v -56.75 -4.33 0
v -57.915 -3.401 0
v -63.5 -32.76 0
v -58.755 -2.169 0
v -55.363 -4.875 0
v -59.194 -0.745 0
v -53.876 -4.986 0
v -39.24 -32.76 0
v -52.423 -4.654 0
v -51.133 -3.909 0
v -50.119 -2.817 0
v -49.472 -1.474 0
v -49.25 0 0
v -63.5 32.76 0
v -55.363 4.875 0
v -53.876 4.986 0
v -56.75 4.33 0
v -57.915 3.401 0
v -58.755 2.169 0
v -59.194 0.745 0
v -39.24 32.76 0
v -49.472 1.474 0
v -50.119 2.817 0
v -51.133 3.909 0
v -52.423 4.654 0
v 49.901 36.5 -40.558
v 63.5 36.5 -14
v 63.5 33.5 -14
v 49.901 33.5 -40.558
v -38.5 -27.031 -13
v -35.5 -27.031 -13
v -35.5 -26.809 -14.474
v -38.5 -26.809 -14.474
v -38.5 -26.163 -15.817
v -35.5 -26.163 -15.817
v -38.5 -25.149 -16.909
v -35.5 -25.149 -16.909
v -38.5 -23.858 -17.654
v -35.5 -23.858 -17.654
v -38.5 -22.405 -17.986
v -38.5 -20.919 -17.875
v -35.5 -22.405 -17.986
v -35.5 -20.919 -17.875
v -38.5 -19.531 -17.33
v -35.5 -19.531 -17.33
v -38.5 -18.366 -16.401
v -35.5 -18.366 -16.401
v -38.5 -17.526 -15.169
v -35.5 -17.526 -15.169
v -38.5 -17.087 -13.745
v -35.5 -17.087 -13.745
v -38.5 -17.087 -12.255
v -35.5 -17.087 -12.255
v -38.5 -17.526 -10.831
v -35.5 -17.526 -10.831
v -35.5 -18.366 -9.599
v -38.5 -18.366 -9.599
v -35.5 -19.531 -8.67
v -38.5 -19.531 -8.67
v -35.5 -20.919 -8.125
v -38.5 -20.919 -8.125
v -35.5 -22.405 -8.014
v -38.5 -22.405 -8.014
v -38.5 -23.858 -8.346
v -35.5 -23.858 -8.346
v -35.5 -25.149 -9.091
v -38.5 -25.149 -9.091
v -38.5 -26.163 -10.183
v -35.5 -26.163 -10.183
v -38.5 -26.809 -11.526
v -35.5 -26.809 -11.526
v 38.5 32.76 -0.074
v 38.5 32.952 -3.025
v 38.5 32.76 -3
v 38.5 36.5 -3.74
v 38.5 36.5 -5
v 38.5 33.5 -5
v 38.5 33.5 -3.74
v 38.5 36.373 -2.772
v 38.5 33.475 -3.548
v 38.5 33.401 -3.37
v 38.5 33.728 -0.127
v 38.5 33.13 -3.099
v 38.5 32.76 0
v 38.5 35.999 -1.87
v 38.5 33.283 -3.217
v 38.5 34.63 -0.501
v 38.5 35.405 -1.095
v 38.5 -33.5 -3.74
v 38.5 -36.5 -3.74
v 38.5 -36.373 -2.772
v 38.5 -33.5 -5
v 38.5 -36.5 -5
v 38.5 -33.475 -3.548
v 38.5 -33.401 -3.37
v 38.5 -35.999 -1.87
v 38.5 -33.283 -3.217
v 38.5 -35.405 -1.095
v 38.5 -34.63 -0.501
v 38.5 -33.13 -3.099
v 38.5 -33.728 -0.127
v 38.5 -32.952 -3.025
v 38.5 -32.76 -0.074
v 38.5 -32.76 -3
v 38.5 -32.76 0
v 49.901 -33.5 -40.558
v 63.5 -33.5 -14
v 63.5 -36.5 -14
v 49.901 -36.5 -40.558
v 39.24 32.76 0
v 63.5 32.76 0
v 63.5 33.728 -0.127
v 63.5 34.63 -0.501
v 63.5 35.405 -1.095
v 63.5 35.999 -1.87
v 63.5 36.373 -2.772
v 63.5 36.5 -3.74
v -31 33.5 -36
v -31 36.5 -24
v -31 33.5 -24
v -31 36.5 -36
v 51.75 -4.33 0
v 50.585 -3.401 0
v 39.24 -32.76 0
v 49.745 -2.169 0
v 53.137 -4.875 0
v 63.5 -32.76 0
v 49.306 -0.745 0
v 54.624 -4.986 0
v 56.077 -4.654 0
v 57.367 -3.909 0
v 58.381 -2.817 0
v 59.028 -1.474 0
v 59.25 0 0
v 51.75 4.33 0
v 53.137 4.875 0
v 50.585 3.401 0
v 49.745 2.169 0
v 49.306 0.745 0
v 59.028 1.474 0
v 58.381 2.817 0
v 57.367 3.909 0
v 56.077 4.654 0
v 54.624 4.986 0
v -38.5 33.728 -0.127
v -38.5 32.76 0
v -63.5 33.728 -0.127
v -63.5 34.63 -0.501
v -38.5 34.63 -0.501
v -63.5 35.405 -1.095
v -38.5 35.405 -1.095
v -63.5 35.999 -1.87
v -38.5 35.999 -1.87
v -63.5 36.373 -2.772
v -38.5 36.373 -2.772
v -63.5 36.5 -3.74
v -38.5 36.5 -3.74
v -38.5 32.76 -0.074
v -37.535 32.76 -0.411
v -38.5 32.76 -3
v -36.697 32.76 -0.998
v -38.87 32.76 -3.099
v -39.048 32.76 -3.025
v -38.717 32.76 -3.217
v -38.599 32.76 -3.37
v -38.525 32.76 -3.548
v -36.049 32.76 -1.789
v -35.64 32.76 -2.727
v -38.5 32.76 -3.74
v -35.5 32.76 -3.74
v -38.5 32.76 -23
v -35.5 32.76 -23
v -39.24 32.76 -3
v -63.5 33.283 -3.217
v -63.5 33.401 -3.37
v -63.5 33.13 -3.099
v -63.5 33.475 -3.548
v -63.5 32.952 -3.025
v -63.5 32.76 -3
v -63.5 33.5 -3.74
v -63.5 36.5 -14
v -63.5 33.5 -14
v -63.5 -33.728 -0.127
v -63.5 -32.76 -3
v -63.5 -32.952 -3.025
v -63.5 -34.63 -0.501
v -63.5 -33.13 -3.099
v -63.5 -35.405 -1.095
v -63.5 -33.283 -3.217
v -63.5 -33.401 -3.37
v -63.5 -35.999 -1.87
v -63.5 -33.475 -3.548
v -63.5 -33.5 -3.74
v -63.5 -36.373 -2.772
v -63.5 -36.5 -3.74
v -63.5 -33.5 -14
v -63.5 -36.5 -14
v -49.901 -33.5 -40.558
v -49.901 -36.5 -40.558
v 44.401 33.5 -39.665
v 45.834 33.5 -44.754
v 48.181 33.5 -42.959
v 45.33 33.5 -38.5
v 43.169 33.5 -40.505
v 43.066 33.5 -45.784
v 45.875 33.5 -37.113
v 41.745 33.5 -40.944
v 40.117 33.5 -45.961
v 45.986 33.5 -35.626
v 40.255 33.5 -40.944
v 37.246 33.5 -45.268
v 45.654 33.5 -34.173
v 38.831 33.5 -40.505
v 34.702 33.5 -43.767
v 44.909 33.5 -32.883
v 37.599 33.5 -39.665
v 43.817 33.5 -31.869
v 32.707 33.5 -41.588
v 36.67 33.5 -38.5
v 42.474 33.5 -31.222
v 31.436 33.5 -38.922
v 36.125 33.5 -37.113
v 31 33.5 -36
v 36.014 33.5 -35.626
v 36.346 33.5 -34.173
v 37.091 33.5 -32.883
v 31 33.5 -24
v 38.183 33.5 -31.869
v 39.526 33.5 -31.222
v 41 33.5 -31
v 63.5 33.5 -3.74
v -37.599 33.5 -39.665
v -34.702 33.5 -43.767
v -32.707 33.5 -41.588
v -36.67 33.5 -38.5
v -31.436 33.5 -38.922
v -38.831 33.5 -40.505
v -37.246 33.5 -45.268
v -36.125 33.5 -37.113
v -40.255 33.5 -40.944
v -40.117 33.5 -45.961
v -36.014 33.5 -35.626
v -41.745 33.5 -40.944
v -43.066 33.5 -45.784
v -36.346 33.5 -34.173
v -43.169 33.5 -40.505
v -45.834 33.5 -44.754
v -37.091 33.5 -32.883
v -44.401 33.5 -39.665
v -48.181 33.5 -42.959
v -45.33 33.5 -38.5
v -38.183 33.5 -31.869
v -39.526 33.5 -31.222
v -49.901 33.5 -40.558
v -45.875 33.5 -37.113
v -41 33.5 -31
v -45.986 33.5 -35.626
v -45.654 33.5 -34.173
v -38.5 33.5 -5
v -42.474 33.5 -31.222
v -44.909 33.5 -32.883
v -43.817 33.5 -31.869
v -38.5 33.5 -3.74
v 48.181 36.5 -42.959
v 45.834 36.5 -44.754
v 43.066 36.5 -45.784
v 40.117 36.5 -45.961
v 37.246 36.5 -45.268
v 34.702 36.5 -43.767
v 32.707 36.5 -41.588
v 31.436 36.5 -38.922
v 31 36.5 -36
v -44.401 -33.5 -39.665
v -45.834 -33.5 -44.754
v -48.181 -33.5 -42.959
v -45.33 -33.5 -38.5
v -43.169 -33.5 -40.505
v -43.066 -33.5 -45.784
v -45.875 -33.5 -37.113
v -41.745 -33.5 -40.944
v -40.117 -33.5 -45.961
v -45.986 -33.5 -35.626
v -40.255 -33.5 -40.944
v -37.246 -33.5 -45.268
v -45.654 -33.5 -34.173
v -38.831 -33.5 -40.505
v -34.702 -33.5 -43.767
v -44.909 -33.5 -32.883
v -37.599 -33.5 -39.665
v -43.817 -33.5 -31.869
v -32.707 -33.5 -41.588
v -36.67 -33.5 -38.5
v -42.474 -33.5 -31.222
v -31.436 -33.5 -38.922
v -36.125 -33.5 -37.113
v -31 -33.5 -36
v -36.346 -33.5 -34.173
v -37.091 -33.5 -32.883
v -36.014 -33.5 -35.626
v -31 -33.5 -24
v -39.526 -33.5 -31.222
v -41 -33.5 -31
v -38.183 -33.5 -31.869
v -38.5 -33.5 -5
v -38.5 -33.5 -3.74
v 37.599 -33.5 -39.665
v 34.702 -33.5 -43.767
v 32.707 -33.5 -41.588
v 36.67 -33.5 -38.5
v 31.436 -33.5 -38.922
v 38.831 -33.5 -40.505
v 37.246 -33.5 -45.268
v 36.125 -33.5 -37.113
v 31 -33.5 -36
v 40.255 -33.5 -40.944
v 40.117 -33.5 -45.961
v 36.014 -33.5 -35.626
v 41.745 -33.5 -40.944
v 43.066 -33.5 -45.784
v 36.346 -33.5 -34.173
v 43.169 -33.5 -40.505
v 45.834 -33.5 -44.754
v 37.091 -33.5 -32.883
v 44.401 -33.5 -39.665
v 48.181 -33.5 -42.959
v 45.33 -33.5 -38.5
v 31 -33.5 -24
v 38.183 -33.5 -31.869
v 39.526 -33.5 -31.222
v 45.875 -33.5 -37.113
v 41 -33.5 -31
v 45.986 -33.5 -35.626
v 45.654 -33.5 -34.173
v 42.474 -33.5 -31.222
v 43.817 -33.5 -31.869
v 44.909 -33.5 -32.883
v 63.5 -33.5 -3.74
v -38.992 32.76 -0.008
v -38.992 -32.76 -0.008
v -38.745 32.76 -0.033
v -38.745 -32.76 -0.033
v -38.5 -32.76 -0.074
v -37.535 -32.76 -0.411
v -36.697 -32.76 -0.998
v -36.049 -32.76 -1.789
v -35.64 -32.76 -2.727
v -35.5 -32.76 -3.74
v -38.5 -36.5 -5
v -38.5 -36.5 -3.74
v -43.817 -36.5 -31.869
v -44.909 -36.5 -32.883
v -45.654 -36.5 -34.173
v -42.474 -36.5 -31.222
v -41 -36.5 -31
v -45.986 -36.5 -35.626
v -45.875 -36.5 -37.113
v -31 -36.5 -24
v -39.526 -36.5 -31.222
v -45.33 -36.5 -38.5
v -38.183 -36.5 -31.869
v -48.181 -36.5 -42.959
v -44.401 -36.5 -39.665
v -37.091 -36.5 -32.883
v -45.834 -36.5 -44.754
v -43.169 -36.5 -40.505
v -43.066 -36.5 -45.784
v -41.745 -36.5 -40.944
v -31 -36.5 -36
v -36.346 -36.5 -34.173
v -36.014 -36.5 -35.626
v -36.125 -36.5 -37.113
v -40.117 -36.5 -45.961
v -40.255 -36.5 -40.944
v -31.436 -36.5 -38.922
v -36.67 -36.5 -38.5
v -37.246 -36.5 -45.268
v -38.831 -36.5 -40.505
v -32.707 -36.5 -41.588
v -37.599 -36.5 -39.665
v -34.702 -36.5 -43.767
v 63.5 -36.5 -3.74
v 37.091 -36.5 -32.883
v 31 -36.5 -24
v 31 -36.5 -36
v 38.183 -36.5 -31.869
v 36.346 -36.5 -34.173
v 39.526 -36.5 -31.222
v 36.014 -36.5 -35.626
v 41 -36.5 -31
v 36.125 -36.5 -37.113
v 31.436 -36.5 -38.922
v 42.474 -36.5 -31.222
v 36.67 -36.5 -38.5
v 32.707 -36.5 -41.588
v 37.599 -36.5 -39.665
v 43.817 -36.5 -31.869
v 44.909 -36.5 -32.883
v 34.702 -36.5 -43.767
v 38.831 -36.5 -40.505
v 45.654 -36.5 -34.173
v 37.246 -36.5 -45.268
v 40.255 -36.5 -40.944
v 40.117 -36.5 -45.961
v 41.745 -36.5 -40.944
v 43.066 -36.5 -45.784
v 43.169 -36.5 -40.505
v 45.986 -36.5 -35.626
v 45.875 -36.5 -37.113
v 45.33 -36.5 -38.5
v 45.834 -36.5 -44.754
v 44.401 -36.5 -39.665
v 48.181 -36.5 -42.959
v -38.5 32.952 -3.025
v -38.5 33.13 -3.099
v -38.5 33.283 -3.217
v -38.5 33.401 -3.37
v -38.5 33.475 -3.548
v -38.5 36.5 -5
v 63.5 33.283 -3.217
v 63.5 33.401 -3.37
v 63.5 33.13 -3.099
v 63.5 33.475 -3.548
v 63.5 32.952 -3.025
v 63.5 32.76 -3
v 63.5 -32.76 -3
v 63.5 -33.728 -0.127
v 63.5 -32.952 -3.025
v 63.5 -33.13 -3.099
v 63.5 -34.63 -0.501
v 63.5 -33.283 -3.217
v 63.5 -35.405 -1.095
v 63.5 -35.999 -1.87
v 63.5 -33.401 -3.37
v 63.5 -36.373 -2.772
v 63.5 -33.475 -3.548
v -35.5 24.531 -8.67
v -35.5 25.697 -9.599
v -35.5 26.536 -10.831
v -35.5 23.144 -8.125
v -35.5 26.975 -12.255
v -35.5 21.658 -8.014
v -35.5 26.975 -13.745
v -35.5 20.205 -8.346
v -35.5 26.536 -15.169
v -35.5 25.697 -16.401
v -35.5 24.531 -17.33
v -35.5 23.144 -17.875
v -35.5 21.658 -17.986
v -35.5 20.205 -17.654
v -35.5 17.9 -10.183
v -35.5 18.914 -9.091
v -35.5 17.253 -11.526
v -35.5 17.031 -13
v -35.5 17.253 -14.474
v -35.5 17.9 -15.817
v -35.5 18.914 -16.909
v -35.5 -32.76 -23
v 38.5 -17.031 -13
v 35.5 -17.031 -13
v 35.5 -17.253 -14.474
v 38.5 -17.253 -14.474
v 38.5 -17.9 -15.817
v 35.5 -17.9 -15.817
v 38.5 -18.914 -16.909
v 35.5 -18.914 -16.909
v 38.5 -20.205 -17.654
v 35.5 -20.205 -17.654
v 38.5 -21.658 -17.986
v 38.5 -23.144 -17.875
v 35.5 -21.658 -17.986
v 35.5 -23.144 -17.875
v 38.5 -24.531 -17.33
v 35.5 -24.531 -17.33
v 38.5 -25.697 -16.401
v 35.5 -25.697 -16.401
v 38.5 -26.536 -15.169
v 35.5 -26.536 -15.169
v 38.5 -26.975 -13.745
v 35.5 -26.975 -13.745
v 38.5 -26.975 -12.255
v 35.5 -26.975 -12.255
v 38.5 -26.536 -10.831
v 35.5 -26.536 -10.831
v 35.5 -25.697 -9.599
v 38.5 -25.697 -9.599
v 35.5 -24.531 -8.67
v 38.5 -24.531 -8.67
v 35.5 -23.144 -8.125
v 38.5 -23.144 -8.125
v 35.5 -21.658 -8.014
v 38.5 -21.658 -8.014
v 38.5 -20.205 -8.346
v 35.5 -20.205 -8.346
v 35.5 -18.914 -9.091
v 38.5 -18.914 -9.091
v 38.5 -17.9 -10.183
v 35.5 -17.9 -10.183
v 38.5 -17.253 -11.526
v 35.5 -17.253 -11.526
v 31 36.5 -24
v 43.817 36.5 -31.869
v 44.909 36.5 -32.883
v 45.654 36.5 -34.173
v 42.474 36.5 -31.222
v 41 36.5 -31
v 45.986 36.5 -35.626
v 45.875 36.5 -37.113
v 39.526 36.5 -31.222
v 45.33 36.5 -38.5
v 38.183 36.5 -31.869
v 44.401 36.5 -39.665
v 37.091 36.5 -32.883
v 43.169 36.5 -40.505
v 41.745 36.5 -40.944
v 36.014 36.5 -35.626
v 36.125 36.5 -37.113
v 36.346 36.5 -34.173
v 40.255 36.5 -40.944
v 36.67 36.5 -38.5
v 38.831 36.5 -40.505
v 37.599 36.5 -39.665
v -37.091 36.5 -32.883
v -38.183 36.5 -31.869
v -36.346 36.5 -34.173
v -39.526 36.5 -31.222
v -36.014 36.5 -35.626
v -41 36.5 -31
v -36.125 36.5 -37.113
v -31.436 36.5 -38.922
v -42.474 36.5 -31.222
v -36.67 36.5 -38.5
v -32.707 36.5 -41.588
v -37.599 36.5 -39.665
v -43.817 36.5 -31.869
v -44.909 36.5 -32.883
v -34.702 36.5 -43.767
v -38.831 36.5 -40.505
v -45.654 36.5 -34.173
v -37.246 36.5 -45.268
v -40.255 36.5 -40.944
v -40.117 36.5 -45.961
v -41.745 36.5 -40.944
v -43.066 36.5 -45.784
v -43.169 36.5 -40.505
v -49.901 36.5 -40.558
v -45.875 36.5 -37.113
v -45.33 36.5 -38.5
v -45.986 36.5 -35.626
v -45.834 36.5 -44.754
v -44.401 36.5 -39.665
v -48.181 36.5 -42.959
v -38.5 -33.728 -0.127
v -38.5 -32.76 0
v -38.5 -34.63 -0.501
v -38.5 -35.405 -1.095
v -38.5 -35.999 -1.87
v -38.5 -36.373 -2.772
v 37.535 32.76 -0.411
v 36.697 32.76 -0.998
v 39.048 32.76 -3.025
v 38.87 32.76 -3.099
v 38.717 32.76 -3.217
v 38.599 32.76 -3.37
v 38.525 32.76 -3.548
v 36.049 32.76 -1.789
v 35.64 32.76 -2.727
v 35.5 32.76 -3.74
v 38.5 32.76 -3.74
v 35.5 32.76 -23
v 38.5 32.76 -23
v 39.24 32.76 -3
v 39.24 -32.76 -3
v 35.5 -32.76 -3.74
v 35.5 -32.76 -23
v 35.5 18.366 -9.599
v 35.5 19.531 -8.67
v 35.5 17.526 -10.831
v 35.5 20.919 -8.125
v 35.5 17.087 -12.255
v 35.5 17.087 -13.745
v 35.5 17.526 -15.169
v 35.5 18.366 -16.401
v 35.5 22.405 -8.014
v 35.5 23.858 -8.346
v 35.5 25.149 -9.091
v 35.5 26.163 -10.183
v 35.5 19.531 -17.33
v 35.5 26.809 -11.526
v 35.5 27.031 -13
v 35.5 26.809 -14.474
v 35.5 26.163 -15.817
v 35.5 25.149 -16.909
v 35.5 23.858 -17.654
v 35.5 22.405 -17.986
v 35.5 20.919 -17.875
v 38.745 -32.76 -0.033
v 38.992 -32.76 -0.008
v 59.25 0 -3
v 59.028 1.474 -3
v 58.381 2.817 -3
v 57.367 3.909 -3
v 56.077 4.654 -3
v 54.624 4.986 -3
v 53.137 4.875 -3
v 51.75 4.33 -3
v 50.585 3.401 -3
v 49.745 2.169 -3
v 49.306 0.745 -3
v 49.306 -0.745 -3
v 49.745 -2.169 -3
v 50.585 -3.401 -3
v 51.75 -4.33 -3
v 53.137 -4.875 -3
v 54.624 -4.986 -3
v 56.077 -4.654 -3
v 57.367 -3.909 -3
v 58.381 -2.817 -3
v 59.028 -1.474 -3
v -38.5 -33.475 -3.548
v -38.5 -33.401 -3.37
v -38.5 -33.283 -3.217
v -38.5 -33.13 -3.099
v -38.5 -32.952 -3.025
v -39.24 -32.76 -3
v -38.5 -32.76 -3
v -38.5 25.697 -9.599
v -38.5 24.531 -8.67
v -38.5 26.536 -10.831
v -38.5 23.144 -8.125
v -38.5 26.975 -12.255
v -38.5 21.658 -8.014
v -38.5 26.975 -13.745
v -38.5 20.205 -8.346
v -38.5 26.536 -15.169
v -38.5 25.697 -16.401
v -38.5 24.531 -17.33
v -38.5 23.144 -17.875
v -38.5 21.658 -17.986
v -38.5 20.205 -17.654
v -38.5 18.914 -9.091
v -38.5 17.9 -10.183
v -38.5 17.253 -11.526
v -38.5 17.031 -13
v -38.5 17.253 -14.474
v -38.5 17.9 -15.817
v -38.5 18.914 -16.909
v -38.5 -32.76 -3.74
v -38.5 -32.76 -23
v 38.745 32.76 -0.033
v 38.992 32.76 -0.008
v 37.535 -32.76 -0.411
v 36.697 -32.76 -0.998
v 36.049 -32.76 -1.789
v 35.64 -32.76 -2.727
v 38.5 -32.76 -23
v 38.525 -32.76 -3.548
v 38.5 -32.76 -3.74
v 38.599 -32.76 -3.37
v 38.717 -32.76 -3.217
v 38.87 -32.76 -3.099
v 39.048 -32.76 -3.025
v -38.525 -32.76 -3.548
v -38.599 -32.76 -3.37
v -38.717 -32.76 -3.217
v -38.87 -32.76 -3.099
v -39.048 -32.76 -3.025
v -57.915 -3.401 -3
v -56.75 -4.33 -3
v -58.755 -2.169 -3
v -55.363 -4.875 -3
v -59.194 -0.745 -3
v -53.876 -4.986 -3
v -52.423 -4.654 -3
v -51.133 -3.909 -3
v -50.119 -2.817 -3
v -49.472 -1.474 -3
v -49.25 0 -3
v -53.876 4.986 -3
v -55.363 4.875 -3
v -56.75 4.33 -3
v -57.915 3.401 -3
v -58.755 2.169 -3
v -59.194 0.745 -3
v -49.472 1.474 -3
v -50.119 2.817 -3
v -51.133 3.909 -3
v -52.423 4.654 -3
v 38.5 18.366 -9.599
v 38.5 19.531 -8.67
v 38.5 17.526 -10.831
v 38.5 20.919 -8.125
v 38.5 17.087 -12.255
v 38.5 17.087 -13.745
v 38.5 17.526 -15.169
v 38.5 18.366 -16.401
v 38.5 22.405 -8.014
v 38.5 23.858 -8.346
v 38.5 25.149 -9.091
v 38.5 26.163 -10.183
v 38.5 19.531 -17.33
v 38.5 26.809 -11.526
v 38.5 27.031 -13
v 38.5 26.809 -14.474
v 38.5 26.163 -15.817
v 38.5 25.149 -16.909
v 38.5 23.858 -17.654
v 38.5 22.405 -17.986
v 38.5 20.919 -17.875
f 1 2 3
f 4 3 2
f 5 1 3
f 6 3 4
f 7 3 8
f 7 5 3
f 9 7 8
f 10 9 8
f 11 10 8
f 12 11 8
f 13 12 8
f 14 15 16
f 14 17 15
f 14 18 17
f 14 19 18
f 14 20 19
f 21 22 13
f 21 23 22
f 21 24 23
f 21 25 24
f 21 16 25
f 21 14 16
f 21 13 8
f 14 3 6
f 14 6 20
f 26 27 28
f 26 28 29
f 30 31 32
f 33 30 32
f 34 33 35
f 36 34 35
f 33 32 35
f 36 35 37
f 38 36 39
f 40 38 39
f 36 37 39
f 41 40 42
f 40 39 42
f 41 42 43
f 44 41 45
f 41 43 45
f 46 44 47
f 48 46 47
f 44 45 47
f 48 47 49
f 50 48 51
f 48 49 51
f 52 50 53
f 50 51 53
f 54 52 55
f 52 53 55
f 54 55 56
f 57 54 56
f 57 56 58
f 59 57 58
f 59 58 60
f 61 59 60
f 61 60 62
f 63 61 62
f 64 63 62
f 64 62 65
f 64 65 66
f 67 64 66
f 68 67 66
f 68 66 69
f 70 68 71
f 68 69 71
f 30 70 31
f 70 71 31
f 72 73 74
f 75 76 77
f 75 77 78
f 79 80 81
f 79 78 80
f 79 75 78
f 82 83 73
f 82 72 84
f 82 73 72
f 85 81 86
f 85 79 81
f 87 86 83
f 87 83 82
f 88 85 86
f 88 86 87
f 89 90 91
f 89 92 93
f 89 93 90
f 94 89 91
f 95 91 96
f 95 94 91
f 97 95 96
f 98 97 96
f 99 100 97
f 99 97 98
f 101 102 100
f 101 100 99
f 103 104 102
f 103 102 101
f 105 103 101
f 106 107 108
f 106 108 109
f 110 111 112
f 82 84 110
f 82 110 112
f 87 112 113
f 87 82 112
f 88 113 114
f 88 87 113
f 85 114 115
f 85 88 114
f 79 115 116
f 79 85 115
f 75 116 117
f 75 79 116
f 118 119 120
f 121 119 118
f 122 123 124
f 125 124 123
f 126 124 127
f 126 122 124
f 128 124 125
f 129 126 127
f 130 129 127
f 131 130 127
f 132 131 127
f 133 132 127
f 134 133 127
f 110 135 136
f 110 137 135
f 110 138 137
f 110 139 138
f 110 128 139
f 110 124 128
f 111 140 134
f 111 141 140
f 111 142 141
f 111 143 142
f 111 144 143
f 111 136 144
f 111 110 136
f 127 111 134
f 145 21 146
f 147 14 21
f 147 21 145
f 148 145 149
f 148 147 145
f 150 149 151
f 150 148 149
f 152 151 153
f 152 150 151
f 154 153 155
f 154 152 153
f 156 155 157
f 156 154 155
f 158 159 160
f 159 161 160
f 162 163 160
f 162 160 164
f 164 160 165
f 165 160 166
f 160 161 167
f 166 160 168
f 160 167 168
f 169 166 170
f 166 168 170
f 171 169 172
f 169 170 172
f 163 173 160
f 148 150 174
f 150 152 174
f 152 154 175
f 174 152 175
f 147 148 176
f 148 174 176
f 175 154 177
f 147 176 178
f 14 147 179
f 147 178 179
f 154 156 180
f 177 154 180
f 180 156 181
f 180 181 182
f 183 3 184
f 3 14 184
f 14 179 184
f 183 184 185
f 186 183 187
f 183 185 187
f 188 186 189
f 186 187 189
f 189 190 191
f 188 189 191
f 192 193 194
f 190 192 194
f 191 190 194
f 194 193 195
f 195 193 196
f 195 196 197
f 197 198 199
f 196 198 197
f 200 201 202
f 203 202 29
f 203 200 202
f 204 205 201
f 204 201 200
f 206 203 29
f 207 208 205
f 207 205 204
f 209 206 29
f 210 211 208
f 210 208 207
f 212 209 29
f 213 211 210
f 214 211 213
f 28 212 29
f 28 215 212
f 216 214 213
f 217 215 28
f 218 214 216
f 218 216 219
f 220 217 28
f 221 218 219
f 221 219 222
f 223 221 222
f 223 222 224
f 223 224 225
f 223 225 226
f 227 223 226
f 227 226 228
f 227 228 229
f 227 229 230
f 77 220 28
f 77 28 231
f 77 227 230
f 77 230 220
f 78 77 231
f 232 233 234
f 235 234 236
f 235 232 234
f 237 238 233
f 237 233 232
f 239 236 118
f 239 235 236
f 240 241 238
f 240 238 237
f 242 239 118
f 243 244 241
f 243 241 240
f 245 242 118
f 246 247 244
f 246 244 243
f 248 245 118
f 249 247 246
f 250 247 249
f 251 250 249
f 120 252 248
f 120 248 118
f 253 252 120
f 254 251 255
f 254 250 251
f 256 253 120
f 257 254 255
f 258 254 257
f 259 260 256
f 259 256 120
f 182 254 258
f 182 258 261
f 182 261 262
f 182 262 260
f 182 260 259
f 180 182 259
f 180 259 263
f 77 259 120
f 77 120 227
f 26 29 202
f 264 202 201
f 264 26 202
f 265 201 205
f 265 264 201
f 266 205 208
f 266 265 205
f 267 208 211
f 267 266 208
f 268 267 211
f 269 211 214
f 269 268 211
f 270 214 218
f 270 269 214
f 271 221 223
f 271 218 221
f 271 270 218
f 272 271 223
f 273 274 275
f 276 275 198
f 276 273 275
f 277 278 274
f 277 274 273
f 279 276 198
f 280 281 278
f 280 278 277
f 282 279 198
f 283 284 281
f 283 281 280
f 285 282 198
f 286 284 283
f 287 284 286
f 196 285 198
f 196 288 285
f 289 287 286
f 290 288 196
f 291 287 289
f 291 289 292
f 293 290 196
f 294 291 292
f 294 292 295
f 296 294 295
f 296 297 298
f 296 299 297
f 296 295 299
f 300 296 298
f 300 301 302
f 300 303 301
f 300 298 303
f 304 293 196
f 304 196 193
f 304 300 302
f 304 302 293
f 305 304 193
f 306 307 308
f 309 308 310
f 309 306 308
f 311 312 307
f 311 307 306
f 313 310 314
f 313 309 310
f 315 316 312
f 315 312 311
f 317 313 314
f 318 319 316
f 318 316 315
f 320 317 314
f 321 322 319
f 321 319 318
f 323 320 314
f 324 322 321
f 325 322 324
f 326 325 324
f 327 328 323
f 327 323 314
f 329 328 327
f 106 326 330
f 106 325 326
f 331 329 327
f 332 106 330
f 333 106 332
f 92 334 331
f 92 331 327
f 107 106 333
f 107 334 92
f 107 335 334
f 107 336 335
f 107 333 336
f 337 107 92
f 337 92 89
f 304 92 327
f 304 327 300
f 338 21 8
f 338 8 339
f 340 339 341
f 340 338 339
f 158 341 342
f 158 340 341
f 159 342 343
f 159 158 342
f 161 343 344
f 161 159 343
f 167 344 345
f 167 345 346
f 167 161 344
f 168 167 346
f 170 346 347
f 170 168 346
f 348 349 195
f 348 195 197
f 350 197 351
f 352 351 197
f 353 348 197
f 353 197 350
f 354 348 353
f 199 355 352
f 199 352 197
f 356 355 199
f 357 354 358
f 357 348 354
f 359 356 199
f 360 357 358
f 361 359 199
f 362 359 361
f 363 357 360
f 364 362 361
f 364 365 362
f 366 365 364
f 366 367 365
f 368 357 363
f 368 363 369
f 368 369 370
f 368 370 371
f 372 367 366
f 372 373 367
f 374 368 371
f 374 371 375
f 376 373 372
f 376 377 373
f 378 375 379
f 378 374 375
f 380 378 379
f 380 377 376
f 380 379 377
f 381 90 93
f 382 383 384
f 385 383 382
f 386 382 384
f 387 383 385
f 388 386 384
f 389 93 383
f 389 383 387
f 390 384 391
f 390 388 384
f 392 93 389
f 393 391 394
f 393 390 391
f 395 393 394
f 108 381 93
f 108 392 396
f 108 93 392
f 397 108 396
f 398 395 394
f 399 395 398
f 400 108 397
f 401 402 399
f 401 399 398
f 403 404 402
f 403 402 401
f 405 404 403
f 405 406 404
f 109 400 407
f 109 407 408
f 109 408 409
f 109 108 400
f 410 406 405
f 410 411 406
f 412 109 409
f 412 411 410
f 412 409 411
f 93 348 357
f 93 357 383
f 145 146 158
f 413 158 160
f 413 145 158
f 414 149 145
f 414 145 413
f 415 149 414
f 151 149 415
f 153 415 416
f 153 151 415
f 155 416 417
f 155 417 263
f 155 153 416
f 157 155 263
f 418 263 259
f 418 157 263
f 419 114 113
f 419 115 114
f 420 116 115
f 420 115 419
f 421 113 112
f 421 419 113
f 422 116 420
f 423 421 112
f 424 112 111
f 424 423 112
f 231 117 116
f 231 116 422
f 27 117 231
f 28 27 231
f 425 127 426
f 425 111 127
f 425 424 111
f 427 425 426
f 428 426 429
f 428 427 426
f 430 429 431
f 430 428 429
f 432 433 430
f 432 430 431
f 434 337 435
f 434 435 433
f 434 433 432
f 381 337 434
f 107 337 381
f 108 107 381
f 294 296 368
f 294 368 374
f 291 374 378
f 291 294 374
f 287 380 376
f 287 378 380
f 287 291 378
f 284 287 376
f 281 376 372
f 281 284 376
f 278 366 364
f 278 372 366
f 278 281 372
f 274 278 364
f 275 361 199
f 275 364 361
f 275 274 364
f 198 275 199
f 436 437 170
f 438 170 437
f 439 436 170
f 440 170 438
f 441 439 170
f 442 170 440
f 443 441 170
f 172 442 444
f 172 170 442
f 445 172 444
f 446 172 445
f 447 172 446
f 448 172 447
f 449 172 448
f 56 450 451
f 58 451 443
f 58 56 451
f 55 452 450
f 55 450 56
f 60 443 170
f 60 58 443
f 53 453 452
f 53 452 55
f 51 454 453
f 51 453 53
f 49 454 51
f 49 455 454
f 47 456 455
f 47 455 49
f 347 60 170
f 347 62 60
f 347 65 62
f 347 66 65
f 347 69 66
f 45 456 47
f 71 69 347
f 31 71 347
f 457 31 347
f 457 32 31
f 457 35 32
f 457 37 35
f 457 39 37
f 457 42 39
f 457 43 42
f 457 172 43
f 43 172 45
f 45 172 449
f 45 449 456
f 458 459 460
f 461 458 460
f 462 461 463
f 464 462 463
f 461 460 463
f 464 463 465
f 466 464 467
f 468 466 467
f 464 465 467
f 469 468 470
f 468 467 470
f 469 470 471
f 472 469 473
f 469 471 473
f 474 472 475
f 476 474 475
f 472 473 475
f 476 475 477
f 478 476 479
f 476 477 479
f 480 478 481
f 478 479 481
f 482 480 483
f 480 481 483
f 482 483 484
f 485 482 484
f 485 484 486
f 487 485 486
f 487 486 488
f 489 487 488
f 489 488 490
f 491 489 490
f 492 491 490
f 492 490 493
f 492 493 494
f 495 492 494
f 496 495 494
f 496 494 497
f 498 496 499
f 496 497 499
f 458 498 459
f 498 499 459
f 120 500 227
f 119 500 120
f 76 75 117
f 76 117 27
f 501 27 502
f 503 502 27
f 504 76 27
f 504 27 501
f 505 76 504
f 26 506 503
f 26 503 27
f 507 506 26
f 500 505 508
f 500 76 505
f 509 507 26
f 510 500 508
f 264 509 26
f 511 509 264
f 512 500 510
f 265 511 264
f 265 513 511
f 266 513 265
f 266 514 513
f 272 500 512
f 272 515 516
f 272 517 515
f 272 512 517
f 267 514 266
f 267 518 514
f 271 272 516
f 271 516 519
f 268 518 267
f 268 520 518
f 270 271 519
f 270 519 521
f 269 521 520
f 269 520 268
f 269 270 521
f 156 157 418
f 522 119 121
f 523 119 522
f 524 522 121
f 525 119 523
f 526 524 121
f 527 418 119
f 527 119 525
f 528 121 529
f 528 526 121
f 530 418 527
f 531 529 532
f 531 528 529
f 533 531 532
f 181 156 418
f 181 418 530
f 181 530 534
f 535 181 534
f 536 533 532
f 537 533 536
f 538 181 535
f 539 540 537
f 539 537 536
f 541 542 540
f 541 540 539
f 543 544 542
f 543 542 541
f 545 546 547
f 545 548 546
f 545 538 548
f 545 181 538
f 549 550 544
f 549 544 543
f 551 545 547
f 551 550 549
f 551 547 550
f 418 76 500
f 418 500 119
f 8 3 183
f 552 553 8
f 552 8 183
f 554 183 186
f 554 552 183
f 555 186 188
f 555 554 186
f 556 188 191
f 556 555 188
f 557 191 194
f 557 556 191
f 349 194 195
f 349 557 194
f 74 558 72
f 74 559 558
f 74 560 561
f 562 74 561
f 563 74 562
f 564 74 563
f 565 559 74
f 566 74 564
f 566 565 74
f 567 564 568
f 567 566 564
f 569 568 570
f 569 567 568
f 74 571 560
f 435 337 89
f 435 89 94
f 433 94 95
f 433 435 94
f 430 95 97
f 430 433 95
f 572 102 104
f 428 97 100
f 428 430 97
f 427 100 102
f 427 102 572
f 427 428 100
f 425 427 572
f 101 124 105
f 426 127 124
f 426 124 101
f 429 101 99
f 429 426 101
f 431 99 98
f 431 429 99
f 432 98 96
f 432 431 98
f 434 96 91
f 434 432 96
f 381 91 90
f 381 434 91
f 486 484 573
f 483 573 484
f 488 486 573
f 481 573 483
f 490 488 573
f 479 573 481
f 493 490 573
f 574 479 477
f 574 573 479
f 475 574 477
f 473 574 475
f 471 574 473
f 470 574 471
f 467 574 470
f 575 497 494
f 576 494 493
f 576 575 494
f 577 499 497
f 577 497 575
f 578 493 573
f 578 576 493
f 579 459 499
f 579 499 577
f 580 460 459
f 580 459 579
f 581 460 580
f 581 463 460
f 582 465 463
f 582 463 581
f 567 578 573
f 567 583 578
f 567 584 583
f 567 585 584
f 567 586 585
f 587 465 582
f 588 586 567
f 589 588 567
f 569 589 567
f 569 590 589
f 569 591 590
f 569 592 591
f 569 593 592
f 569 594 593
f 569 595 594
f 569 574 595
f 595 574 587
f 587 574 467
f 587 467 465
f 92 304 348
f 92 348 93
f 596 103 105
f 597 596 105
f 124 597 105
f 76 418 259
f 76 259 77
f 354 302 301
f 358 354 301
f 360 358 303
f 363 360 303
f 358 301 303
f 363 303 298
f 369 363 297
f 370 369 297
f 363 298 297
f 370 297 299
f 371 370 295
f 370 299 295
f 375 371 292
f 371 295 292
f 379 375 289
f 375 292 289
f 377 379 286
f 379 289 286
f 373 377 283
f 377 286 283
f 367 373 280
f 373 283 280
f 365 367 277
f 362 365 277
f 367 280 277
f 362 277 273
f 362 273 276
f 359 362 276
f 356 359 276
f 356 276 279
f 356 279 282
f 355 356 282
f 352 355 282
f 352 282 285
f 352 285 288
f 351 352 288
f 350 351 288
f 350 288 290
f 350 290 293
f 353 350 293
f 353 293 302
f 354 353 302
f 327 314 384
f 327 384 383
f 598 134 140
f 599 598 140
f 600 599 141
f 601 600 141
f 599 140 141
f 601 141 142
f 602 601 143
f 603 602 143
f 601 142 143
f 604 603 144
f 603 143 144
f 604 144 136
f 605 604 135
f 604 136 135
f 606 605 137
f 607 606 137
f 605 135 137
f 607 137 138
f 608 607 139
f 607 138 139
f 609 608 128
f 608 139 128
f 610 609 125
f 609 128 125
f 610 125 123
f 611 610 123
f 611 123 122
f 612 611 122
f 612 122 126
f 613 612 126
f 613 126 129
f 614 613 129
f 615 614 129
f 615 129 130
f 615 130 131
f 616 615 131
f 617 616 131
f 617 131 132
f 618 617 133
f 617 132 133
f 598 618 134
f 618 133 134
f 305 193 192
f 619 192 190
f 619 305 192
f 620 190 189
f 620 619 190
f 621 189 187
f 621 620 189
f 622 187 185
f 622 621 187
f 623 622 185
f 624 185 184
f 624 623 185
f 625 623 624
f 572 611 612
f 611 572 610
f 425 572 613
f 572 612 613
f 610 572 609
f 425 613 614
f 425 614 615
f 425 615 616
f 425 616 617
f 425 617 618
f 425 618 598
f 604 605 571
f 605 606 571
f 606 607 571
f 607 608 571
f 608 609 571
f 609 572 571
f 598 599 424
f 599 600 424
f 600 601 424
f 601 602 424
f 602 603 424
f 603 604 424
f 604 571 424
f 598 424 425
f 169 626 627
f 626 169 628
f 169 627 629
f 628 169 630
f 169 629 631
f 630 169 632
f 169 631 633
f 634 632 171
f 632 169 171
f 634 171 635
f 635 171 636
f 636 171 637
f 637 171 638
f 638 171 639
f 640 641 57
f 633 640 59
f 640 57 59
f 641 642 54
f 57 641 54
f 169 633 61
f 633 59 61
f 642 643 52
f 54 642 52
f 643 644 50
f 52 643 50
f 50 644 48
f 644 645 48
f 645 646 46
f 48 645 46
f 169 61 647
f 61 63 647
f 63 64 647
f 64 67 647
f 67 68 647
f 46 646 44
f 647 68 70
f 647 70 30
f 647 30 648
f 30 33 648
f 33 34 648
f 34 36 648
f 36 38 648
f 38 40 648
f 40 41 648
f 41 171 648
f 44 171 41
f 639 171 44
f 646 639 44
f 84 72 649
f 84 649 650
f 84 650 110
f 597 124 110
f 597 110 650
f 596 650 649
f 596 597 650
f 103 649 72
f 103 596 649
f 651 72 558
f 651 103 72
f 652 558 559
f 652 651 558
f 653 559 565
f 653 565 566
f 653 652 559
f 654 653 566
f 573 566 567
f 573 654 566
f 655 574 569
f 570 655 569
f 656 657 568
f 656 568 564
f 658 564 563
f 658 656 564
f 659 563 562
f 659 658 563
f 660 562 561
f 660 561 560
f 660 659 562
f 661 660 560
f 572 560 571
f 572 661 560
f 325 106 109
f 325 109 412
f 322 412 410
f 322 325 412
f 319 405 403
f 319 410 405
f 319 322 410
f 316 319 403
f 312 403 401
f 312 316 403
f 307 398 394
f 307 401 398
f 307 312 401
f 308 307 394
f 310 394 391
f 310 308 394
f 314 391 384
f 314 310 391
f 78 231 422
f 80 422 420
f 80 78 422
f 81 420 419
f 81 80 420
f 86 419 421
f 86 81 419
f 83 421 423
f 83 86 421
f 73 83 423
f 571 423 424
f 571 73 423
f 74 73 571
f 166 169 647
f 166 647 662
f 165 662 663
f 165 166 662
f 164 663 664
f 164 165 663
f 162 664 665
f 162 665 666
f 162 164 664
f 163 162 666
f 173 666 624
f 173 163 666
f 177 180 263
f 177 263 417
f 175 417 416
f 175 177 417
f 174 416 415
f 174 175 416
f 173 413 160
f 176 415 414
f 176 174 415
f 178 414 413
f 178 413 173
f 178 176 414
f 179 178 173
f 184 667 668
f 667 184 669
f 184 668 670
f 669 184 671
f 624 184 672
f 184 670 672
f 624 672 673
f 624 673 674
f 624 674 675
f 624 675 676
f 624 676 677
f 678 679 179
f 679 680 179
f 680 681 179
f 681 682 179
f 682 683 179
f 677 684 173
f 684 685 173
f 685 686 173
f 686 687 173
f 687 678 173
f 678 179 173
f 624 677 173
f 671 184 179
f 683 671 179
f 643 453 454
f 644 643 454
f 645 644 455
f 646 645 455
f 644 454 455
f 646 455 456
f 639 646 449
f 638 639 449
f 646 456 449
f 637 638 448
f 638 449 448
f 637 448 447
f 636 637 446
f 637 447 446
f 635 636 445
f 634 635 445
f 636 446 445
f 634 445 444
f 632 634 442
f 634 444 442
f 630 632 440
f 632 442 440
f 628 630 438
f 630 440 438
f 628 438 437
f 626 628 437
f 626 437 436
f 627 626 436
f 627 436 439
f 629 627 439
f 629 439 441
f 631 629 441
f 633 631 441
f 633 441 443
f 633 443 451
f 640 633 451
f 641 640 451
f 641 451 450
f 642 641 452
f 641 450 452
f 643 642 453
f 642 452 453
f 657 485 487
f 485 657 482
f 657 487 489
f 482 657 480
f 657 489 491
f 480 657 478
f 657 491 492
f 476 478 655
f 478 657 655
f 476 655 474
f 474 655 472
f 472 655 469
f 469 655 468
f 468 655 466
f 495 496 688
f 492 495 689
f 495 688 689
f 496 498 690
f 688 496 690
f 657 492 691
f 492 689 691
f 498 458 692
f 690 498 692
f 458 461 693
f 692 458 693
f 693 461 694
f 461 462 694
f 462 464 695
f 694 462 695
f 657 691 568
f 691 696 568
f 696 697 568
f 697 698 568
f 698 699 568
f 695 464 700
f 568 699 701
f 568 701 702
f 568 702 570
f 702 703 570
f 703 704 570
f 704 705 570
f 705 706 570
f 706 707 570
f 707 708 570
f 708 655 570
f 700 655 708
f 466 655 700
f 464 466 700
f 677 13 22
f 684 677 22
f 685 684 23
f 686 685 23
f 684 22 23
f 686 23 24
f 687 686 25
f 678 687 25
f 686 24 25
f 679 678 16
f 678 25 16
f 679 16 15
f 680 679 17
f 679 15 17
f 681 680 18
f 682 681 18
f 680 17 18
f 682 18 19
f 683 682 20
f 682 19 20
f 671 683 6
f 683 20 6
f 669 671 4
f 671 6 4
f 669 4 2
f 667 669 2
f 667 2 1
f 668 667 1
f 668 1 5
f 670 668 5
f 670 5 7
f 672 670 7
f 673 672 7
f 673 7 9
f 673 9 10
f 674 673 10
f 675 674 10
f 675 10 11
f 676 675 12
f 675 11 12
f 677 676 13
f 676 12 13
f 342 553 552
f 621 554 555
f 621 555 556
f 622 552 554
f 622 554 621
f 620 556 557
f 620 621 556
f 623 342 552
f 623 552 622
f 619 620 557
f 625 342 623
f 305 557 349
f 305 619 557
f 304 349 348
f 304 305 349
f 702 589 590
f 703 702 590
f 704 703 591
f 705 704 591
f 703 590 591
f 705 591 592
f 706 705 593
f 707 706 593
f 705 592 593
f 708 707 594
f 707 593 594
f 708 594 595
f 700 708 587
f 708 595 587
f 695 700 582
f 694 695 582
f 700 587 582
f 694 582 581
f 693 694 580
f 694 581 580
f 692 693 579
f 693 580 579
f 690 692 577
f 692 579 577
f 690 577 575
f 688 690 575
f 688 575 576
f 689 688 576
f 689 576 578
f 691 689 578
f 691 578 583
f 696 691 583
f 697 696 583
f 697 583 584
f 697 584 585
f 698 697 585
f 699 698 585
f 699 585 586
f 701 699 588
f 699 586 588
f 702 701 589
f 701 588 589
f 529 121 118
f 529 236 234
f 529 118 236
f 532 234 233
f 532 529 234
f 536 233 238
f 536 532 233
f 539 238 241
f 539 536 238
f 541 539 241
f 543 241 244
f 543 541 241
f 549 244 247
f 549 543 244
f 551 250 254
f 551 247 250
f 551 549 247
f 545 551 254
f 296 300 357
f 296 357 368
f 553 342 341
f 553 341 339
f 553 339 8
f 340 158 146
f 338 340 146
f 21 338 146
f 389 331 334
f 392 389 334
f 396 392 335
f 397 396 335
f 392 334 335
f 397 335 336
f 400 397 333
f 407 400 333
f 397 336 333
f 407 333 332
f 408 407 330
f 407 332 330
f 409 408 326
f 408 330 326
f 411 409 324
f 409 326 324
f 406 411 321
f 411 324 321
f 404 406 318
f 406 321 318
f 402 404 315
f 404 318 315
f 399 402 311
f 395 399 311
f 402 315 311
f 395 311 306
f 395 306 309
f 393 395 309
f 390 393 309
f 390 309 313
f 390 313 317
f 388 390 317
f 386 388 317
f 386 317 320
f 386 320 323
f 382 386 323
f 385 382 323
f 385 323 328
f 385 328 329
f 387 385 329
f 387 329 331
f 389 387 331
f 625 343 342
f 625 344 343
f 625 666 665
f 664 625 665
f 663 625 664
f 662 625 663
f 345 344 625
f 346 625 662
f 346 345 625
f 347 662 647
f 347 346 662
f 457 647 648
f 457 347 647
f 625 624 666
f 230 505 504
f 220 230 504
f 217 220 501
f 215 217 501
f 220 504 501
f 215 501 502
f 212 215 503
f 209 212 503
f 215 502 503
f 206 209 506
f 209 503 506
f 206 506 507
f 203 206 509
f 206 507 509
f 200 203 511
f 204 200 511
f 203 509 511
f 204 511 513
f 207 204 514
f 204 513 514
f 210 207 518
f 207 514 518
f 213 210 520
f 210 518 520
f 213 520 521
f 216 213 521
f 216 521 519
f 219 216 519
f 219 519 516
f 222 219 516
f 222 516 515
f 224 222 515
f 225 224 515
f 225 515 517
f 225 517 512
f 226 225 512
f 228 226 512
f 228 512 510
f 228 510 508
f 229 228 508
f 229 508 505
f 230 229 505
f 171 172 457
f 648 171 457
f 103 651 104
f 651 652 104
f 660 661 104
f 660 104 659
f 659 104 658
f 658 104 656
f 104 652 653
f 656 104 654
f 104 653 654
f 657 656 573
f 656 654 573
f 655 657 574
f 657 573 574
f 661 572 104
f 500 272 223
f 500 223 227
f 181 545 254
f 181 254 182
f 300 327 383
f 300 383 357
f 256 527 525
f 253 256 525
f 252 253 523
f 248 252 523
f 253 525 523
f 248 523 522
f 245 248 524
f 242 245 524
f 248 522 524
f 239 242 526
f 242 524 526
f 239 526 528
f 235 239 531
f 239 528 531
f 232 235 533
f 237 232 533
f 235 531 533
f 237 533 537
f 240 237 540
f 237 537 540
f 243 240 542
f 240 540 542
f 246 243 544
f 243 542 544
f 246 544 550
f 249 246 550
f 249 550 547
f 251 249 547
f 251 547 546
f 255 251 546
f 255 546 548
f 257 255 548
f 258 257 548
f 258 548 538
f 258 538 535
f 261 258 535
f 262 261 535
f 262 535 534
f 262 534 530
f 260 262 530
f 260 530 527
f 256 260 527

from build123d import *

# Parameters (mm, degrees)
SKETCH_1_W                         = 127
SKETCH_1_H                         = 73
SKETCH_1_R                         = 5
SM_BASE_FLANGE_1_DEPTH             = 3
SM_EDGE_FLANGE_1_STRIP_W           = 13.48
SM_EDGE_FLANGE_1_STRIP_H           = 3
SM_EDGE_FLANGE_1_STRIP_CUT_DEPTH   = 127
SM_EDGE_FLANGE_1_STRIP_2_W         = 13.48
SM_EDGE_FLANGE_1_STRIP_2_H         = 3
SM_EDGE_FLANGE_1_STRIP_CUT_2_DEPTH = 127
SM_EDGE_FLANGE_1_DEPTH             = 127
SM_EDGE_FLANGE_1_BEND_DEPTH        = 127
SKETCH_12_OUTSIDE_W                = 159.708
SKETCH_12_OUTSIDE_H                = 78.708
SKETCH_12_OUTSIDE_R                = 5
CUT_EXTRUDE_4_DEPTH                = 108.131928014
SM_EDGE_FLANGE_2_STRIP_W           = 13.48
SM_EDGE_FLANGE_2_STRIP_H           = 3
SM_EDGE_FLANGE_2_STRIP_CUT_DEPTH   = 65.52
SM_EDGE_FLANGE_2_STRIP_2_W         = 13.48
SM_EDGE_FLANGE_2_STRIP_2_H         = 3
SM_EDGE_FLANGE_2_STRIP_CUT_2_DEPTH = 65.52
SM_EDGE_FLANGE_2_DEPTH             = 65.52
SM_START                           = 3
SM_EDGE_FLANGE_2_PROFILE_W         = 65.52
SM_EDGE_FLANGE_2_PROFILE_H         = 19.26
SM_EDGE_FLANGE_2_PROFILE_R         = 5
SM_EDGE_FLANGE_2_FLAT_DEPTH        = 3
SM_EDGE_FLANGE_2_BEND_DEPTH        = 65.52
SM_EDGE_FLANGE_2_PROFILE_2_W       = 65.52
SM_EDGE_FLANGE_2_PROFILE_2_H       = 19.26
SM_EDGE_FLANGE_2_PROFILE_2_R       = 5
SM_EDGE_FLANGE_2_FLAT_2_DEPTH      = 3


# Sheet-metal steps are written as plain solids
with BuildPart() as part:
    # Sketch 1 → Базовая кромка1 (new body)
    with BuildSketch(Plane.XY):
        Rectangle(SKETCH_1_W, SKETCH_1_H)
        with Locations((-54.25, 0)):
            Circle(SKETCH_1_R, mode=Mode.SUBTRACT)
        with Locations((54.25, 0)):
            Circle(SKETCH_1_R, mode=Mode.SUBTRACT)
    extrude(amount=-SM_BASE_FLANGE_1_DEPTH)

    # Ребро-кромка1 strip (across the edge) → Ребро-кромка1 strip cut (cut)
    with BuildSketch(Plane(origin=(-63.5, 36.5, -3), x_dir=(0, -1, 0), z_dir=(1, 0, 0))):
        with Locations((-3, -1.5)):
            Rectangle(SM_EDGE_FLANGE_1_STRIP_W, SM_EDGE_FLANGE_1_STRIP_H)
    extrude(amount=SM_EDGE_FLANGE_1_STRIP_CUT_DEPTH, mode=Mode.SUBTRACT)

    # Ребро-кромка1 strip 2 (across the edge) → Ребро-кромка1 strip cut 2 (cut)
    with BuildSketch(Plane(origin=(63.5, -36.5, -3), x_dir=(0, 1, 0), z_dir=(-1, 0, 0))):
        with Locations((-3, -1.5)):
            Rectangle(SM_EDGE_FLANGE_1_STRIP_2_W, SM_EDGE_FLANGE_1_STRIP_2_H)
    extrude(amount=SM_EDGE_FLANGE_1_STRIP_CUT_2_DEPTH, mode=Mode.SUBTRACT)

    # Ребро-кромка1 section (across the edge) → Ребро-кромка1 (add)
    with BuildSketch(Plane(origin=(-63.5, 36.5, -3), x_dir=(0, -1, 0), z_dir=(1, 0, 0))):
        with BuildLine():
            Line((0, 0.74), (0, 43))
            Line((0, 43), (3, 43))
            Line((3, 43), (3, 0.74))
            ThreePointArc((3, 0.74), (3.216740982, 0.216740982), (3.74, 0))
            Line((3.74, 0), (3.74, -3))
            ThreePointArc((3.74, -3), (1.095420638, -1.904579362), (0, 0.74))
        make_face()
    extrude(amount=SM_EDGE_FLANGE_1_DEPTH)

    # Ребро-кромка1 section 2 (across the edge) → Ребро-кромка1 bend (add)
    with BuildSketch(Plane(origin=(63.5, -36.5, -3), x_dir=(0, 1, 0), z_dir=(-1, 0, 0))):
        with BuildLine():
            Line((0, 0.74), (0, 43))
            Line((0, 43), (3, 43))
            Line((3, 43), (3, 0.74))
            ThreePointArc((3, 0.74), (3.216740982, 0.216740982), (3.74, 0))
            Line((3.74, 0), (3.74, -3))
            ThreePointArc((3.74, -3), (1.095420638, -1.904579362), (0, 0.74))
        make_face()
    extrude(amount=SM_EDGE_FLANGE_1_BEND_DEPTH)

    # Эскиз12 outside → Вырез-Вытянуть4 (cut, through all)
    # profile 1 of 3: a face of its own
    with BuildSketch(Plane(origin=(0, 36.5, 0), x_dir=(1, 0, 0), z_dir=(0, 1, 0))):
        with Locations((0, 23)):
            Rectangle(SKETCH_12_OUTSIDE_W, SKETCH_12_OUTSIDE_H)
        with BuildLine():
            Line((63.5, 14), (49.900936783, 40.557776255))
            ThreePointArc((49.900936783, 40.557776255), (38.655790946, 45.721351959), (31, 36))
            Line((31, 36), (31, 24))
            Line((31, 24), (-31, 24))
            Line((-31, 24), (-31, 36))
            ThreePointArc((-31, 36), (-38.655790946, 45.721351959), (-49.900936783, 40.557776255))
            Line((-49.900936783, 40.557776255), (-63.5, 14))
            Line((-63.5, 14), (-63.5, 0))
            Line((-63.5, 0), (-38.5, 0))
            Line((-38.5, 0), (-38.5, 5))
            Line((-38.5, 5), (38.5, 5))
            Line((38.5, 5), (38.5, 0))
            Line((38.5, 0), (63.5, 0))
            Line((63.5, 0), (63.5, 14))
        make_face(mode=Mode.SUBTRACT)
    # profile 2 of 3: a face of its own
    with BuildSketch(Plane(origin=(0, 36.5, 0), x_dir=(1, 0, 0), z_dir=(0, 1, 0))):
        with Locations(Location((41, 36, 0), (0, 0, 270))):
            Circle(SKETCH_12_OUTSIDE_R)
    # profile 3 of 3: a face of its own
    with BuildSketch(Plane(origin=(0, 36.5, 0), x_dir=(1, 0, 0), z_dir=(0, 1, 0))):
        with Locations(Location((-41, 36, 0), (0, 0, 270))):
            Circle(SKETCH_12_OUTSIDE_R)
    extrude(amount=-CUT_EXTRUDE_4_DEPTH, mode=Mode.SUBTRACT)

    # Ребро-кромка2 strip (across the edge) → Ребро-кромка2 strip cut (cut)
    with BuildSketch(Plane(origin=(38.5, -32.76, -3), x_dir=(1, 0, 0), z_dir=(0, 1, 0))):
        with Locations((-6, -1.5)):
            Rectangle(SM_EDGE_FLANGE_2_STRIP_W, SM_EDGE_FLANGE_2_STRIP_H)
    extrude(amount=SM_EDGE_FLANGE_2_STRIP_CUT_DEPTH, mode=Mode.SUBTRACT)

    # Ребро-кромка2 strip 2 (across the edge) → Ребро-кромка2 strip cut 2 (cut)
    with BuildSketch(Plane(origin=(-38.5, 32.76, -3), x_dir=(-1, 0, 0), z_dir=(0, -1, 0))):
        with Locations((-6, -1.5)):
            Rectangle(SM_EDGE_FLANGE_2_STRIP_2_W, SM_EDGE_FLANGE_2_STRIP_2_H)
    extrude(amount=SM_EDGE_FLANGE_2_STRIP_CUT_2_DEPTH, mode=Mode.SUBTRACT)

    # Ребро-кромка2 bend section (across the edge) → Ребро-кромка2 (add)
    with BuildSketch(Plane(origin=(38.5, -32.76, -3), x_dir=(1, 0, 0), z_dir=(0, 1, 0))):
        with BuildLine():
            Line((-3, 0.74), (0, 0.74))
            ThreePointArc((0, 0.74), (0.216740982, 0.216740982), (0.74, 0))
            Line((0.74, 0), (0.74, -3))
            ThreePointArc((0.74, -3), (-1.904579362, -1.904579362), (-3, 0.74))
        make_face()
    extrude(amount=SM_EDGE_FLANGE_2_DEPTH)

    # Ребро-кромка2 profile (on flange) → Ребро-кромка2 flat (add)
    with BuildSketch(Plane(origin=(38.5, 0, -3), x_dir=(0, 1, 0), z_dir=(-1, 0, 0)).offset(SM_START)):
        with Locations((0, 10.37)):
            Rectangle(SM_EDGE_FLANGE_2_PROFILE_W, SM_EDGE_FLANGE_2_PROFILE_H)
        with Locations((22.031313941, 10)):
            Circle(SM_EDGE_FLANGE_2_PROFILE_R, mode=Mode.SUBTRACT)
        with Locations((-22.031313941, 10)):
            Circle(SM_EDGE_FLANGE_2_PROFILE_R, mode=Mode.SUBTRACT)
    extrude(amount=-SM_EDGE_FLANGE_2_FLAT_DEPTH)

    # Ребро-кромка2 bend section 2 (across the edge) → Ребро-кромка2 bend (add)
    with BuildSketch(Plane(origin=(-38.5, 32.76, -3), x_dir=(-1, 0, 0), z_dir=(0, -1, 0))):
        with BuildLine():
            Line((-3, 0.74), (0, 0.74))
            ThreePointArc((0, 0.74), (0.216740982, 0.216740982), (0.74, 0))
            Line((0.74, 0), (0.74, -3))
            ThreePointArc((0.74, -3), (-1.904579362, -1.904579362), (-3, 0.74))
        make_face()
    extrude(amount=SM_EDGE_FLANGE_2_BEND_DEPTH)

    # Ребро-кромка2 profile 2 (on flange) → Ребро-кромка2 flat 2 (add)
    with BuildSketch(Plane(origin=(-38.5, 0, -3), x_dir=(0, -1, 0), z_dir=(1, 0, 0)).offset(SM_START)):
        with Locations((0, 10.37)):
            Rectangle(SM_EDGE_FLANGE_2_PROFILE_2_W, SM_EDGE_FLANGE_2_PROFILE_2_H)
        with Locations((-22.031313941, 10)):
            Circle(SM_EDGE_FLANGE_2_PROFILE_2_R, mode=Mode.SUBTRACT)
        with Locations((22.031313941, 10)):
            Circle(SM_EDGE_FLANGE_2_PROFILE_2_R, mode=Mode.SUBTRACT)
    extrude(amount=-SM_EDGE_FLANGE_2_FLAT_2_DEPTH)


solid = part.part
